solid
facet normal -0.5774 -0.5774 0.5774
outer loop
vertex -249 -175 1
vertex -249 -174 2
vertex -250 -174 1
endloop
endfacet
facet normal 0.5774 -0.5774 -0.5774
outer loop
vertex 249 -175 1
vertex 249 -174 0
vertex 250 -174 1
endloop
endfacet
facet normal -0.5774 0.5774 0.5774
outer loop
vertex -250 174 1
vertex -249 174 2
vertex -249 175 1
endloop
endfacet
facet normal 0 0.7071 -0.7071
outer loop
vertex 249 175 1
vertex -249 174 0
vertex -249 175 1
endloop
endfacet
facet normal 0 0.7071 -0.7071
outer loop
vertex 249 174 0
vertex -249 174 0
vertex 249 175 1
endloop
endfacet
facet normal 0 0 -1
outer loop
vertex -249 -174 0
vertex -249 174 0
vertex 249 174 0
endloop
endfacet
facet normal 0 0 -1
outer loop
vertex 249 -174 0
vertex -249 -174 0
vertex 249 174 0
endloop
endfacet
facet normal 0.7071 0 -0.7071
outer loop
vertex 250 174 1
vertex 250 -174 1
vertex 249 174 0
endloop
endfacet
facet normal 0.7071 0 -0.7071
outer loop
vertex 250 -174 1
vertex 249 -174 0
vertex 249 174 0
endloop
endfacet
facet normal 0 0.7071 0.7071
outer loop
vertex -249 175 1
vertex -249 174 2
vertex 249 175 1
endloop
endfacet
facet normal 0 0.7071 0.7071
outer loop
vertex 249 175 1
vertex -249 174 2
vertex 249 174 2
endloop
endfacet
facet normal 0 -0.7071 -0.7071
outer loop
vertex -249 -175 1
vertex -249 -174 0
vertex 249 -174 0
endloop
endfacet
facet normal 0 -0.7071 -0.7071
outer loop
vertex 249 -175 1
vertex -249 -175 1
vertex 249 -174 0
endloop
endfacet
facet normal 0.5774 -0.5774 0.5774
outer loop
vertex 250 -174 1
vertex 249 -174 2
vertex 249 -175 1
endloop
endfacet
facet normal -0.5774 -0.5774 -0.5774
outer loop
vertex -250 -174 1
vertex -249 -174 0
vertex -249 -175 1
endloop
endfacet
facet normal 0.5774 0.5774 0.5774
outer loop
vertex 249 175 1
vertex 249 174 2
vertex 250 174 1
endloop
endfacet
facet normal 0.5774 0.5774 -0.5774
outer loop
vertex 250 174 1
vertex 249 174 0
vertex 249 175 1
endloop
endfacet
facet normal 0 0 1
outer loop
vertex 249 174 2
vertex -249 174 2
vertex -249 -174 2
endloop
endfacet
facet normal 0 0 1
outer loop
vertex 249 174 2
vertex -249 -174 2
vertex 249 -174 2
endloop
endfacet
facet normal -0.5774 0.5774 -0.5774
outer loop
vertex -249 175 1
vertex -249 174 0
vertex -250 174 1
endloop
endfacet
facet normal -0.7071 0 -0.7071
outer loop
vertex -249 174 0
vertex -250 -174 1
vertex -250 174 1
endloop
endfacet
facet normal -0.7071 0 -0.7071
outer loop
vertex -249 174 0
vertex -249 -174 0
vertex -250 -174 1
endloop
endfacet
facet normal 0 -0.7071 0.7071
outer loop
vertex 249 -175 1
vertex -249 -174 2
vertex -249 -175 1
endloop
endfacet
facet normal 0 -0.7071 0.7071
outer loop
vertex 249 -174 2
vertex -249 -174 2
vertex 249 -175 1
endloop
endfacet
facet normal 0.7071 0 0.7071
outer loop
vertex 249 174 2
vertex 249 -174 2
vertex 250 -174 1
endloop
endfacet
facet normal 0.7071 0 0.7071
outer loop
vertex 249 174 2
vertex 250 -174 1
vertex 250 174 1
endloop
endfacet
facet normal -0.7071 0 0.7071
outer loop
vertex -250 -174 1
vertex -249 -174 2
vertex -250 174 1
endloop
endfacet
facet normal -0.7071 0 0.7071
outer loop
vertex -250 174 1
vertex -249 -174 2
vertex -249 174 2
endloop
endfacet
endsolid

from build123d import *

# Parameters (mm, degrees)
F0_W     = 500
F0_H     = 350
F1_DEPTH = 2
F2_SIZE  = 0.99999


# Not quite as in the source:
# - a fillet or chamfer is up to 0.001 mm smaller than in the source, because OpenCascade refuses the exact size


with BuildPart() as f1:
    # F0 (on Top) → F1 (new body)
    with BuildSketch(Plane.XY):
        Rectangle(F0_W, F0_H)
    extrude(amount=F1_DEPTH)

    # F2 (size 1 in the source; OpenCascade refuses exactly that, so slightly less here)
    f2_edges = [f1.edges().sort_by_distance(p)[0] for p in [
        (0, 175, 0),
        (-250, 0, 0),
        (-250, 0, 2),
        (0, 175, 2),
        (250, 0, 0),
        (0, -175, 2),
        (250, 0, 2),
        (0, -175, 0),
        (-250, -175, 1),
        (-250, 175, 1),
        (250, 175, 1),
        (250, -175, 1),
    ]]
    chamfer(f2_edges, length=F2_SIZE)


solid = f1.part
